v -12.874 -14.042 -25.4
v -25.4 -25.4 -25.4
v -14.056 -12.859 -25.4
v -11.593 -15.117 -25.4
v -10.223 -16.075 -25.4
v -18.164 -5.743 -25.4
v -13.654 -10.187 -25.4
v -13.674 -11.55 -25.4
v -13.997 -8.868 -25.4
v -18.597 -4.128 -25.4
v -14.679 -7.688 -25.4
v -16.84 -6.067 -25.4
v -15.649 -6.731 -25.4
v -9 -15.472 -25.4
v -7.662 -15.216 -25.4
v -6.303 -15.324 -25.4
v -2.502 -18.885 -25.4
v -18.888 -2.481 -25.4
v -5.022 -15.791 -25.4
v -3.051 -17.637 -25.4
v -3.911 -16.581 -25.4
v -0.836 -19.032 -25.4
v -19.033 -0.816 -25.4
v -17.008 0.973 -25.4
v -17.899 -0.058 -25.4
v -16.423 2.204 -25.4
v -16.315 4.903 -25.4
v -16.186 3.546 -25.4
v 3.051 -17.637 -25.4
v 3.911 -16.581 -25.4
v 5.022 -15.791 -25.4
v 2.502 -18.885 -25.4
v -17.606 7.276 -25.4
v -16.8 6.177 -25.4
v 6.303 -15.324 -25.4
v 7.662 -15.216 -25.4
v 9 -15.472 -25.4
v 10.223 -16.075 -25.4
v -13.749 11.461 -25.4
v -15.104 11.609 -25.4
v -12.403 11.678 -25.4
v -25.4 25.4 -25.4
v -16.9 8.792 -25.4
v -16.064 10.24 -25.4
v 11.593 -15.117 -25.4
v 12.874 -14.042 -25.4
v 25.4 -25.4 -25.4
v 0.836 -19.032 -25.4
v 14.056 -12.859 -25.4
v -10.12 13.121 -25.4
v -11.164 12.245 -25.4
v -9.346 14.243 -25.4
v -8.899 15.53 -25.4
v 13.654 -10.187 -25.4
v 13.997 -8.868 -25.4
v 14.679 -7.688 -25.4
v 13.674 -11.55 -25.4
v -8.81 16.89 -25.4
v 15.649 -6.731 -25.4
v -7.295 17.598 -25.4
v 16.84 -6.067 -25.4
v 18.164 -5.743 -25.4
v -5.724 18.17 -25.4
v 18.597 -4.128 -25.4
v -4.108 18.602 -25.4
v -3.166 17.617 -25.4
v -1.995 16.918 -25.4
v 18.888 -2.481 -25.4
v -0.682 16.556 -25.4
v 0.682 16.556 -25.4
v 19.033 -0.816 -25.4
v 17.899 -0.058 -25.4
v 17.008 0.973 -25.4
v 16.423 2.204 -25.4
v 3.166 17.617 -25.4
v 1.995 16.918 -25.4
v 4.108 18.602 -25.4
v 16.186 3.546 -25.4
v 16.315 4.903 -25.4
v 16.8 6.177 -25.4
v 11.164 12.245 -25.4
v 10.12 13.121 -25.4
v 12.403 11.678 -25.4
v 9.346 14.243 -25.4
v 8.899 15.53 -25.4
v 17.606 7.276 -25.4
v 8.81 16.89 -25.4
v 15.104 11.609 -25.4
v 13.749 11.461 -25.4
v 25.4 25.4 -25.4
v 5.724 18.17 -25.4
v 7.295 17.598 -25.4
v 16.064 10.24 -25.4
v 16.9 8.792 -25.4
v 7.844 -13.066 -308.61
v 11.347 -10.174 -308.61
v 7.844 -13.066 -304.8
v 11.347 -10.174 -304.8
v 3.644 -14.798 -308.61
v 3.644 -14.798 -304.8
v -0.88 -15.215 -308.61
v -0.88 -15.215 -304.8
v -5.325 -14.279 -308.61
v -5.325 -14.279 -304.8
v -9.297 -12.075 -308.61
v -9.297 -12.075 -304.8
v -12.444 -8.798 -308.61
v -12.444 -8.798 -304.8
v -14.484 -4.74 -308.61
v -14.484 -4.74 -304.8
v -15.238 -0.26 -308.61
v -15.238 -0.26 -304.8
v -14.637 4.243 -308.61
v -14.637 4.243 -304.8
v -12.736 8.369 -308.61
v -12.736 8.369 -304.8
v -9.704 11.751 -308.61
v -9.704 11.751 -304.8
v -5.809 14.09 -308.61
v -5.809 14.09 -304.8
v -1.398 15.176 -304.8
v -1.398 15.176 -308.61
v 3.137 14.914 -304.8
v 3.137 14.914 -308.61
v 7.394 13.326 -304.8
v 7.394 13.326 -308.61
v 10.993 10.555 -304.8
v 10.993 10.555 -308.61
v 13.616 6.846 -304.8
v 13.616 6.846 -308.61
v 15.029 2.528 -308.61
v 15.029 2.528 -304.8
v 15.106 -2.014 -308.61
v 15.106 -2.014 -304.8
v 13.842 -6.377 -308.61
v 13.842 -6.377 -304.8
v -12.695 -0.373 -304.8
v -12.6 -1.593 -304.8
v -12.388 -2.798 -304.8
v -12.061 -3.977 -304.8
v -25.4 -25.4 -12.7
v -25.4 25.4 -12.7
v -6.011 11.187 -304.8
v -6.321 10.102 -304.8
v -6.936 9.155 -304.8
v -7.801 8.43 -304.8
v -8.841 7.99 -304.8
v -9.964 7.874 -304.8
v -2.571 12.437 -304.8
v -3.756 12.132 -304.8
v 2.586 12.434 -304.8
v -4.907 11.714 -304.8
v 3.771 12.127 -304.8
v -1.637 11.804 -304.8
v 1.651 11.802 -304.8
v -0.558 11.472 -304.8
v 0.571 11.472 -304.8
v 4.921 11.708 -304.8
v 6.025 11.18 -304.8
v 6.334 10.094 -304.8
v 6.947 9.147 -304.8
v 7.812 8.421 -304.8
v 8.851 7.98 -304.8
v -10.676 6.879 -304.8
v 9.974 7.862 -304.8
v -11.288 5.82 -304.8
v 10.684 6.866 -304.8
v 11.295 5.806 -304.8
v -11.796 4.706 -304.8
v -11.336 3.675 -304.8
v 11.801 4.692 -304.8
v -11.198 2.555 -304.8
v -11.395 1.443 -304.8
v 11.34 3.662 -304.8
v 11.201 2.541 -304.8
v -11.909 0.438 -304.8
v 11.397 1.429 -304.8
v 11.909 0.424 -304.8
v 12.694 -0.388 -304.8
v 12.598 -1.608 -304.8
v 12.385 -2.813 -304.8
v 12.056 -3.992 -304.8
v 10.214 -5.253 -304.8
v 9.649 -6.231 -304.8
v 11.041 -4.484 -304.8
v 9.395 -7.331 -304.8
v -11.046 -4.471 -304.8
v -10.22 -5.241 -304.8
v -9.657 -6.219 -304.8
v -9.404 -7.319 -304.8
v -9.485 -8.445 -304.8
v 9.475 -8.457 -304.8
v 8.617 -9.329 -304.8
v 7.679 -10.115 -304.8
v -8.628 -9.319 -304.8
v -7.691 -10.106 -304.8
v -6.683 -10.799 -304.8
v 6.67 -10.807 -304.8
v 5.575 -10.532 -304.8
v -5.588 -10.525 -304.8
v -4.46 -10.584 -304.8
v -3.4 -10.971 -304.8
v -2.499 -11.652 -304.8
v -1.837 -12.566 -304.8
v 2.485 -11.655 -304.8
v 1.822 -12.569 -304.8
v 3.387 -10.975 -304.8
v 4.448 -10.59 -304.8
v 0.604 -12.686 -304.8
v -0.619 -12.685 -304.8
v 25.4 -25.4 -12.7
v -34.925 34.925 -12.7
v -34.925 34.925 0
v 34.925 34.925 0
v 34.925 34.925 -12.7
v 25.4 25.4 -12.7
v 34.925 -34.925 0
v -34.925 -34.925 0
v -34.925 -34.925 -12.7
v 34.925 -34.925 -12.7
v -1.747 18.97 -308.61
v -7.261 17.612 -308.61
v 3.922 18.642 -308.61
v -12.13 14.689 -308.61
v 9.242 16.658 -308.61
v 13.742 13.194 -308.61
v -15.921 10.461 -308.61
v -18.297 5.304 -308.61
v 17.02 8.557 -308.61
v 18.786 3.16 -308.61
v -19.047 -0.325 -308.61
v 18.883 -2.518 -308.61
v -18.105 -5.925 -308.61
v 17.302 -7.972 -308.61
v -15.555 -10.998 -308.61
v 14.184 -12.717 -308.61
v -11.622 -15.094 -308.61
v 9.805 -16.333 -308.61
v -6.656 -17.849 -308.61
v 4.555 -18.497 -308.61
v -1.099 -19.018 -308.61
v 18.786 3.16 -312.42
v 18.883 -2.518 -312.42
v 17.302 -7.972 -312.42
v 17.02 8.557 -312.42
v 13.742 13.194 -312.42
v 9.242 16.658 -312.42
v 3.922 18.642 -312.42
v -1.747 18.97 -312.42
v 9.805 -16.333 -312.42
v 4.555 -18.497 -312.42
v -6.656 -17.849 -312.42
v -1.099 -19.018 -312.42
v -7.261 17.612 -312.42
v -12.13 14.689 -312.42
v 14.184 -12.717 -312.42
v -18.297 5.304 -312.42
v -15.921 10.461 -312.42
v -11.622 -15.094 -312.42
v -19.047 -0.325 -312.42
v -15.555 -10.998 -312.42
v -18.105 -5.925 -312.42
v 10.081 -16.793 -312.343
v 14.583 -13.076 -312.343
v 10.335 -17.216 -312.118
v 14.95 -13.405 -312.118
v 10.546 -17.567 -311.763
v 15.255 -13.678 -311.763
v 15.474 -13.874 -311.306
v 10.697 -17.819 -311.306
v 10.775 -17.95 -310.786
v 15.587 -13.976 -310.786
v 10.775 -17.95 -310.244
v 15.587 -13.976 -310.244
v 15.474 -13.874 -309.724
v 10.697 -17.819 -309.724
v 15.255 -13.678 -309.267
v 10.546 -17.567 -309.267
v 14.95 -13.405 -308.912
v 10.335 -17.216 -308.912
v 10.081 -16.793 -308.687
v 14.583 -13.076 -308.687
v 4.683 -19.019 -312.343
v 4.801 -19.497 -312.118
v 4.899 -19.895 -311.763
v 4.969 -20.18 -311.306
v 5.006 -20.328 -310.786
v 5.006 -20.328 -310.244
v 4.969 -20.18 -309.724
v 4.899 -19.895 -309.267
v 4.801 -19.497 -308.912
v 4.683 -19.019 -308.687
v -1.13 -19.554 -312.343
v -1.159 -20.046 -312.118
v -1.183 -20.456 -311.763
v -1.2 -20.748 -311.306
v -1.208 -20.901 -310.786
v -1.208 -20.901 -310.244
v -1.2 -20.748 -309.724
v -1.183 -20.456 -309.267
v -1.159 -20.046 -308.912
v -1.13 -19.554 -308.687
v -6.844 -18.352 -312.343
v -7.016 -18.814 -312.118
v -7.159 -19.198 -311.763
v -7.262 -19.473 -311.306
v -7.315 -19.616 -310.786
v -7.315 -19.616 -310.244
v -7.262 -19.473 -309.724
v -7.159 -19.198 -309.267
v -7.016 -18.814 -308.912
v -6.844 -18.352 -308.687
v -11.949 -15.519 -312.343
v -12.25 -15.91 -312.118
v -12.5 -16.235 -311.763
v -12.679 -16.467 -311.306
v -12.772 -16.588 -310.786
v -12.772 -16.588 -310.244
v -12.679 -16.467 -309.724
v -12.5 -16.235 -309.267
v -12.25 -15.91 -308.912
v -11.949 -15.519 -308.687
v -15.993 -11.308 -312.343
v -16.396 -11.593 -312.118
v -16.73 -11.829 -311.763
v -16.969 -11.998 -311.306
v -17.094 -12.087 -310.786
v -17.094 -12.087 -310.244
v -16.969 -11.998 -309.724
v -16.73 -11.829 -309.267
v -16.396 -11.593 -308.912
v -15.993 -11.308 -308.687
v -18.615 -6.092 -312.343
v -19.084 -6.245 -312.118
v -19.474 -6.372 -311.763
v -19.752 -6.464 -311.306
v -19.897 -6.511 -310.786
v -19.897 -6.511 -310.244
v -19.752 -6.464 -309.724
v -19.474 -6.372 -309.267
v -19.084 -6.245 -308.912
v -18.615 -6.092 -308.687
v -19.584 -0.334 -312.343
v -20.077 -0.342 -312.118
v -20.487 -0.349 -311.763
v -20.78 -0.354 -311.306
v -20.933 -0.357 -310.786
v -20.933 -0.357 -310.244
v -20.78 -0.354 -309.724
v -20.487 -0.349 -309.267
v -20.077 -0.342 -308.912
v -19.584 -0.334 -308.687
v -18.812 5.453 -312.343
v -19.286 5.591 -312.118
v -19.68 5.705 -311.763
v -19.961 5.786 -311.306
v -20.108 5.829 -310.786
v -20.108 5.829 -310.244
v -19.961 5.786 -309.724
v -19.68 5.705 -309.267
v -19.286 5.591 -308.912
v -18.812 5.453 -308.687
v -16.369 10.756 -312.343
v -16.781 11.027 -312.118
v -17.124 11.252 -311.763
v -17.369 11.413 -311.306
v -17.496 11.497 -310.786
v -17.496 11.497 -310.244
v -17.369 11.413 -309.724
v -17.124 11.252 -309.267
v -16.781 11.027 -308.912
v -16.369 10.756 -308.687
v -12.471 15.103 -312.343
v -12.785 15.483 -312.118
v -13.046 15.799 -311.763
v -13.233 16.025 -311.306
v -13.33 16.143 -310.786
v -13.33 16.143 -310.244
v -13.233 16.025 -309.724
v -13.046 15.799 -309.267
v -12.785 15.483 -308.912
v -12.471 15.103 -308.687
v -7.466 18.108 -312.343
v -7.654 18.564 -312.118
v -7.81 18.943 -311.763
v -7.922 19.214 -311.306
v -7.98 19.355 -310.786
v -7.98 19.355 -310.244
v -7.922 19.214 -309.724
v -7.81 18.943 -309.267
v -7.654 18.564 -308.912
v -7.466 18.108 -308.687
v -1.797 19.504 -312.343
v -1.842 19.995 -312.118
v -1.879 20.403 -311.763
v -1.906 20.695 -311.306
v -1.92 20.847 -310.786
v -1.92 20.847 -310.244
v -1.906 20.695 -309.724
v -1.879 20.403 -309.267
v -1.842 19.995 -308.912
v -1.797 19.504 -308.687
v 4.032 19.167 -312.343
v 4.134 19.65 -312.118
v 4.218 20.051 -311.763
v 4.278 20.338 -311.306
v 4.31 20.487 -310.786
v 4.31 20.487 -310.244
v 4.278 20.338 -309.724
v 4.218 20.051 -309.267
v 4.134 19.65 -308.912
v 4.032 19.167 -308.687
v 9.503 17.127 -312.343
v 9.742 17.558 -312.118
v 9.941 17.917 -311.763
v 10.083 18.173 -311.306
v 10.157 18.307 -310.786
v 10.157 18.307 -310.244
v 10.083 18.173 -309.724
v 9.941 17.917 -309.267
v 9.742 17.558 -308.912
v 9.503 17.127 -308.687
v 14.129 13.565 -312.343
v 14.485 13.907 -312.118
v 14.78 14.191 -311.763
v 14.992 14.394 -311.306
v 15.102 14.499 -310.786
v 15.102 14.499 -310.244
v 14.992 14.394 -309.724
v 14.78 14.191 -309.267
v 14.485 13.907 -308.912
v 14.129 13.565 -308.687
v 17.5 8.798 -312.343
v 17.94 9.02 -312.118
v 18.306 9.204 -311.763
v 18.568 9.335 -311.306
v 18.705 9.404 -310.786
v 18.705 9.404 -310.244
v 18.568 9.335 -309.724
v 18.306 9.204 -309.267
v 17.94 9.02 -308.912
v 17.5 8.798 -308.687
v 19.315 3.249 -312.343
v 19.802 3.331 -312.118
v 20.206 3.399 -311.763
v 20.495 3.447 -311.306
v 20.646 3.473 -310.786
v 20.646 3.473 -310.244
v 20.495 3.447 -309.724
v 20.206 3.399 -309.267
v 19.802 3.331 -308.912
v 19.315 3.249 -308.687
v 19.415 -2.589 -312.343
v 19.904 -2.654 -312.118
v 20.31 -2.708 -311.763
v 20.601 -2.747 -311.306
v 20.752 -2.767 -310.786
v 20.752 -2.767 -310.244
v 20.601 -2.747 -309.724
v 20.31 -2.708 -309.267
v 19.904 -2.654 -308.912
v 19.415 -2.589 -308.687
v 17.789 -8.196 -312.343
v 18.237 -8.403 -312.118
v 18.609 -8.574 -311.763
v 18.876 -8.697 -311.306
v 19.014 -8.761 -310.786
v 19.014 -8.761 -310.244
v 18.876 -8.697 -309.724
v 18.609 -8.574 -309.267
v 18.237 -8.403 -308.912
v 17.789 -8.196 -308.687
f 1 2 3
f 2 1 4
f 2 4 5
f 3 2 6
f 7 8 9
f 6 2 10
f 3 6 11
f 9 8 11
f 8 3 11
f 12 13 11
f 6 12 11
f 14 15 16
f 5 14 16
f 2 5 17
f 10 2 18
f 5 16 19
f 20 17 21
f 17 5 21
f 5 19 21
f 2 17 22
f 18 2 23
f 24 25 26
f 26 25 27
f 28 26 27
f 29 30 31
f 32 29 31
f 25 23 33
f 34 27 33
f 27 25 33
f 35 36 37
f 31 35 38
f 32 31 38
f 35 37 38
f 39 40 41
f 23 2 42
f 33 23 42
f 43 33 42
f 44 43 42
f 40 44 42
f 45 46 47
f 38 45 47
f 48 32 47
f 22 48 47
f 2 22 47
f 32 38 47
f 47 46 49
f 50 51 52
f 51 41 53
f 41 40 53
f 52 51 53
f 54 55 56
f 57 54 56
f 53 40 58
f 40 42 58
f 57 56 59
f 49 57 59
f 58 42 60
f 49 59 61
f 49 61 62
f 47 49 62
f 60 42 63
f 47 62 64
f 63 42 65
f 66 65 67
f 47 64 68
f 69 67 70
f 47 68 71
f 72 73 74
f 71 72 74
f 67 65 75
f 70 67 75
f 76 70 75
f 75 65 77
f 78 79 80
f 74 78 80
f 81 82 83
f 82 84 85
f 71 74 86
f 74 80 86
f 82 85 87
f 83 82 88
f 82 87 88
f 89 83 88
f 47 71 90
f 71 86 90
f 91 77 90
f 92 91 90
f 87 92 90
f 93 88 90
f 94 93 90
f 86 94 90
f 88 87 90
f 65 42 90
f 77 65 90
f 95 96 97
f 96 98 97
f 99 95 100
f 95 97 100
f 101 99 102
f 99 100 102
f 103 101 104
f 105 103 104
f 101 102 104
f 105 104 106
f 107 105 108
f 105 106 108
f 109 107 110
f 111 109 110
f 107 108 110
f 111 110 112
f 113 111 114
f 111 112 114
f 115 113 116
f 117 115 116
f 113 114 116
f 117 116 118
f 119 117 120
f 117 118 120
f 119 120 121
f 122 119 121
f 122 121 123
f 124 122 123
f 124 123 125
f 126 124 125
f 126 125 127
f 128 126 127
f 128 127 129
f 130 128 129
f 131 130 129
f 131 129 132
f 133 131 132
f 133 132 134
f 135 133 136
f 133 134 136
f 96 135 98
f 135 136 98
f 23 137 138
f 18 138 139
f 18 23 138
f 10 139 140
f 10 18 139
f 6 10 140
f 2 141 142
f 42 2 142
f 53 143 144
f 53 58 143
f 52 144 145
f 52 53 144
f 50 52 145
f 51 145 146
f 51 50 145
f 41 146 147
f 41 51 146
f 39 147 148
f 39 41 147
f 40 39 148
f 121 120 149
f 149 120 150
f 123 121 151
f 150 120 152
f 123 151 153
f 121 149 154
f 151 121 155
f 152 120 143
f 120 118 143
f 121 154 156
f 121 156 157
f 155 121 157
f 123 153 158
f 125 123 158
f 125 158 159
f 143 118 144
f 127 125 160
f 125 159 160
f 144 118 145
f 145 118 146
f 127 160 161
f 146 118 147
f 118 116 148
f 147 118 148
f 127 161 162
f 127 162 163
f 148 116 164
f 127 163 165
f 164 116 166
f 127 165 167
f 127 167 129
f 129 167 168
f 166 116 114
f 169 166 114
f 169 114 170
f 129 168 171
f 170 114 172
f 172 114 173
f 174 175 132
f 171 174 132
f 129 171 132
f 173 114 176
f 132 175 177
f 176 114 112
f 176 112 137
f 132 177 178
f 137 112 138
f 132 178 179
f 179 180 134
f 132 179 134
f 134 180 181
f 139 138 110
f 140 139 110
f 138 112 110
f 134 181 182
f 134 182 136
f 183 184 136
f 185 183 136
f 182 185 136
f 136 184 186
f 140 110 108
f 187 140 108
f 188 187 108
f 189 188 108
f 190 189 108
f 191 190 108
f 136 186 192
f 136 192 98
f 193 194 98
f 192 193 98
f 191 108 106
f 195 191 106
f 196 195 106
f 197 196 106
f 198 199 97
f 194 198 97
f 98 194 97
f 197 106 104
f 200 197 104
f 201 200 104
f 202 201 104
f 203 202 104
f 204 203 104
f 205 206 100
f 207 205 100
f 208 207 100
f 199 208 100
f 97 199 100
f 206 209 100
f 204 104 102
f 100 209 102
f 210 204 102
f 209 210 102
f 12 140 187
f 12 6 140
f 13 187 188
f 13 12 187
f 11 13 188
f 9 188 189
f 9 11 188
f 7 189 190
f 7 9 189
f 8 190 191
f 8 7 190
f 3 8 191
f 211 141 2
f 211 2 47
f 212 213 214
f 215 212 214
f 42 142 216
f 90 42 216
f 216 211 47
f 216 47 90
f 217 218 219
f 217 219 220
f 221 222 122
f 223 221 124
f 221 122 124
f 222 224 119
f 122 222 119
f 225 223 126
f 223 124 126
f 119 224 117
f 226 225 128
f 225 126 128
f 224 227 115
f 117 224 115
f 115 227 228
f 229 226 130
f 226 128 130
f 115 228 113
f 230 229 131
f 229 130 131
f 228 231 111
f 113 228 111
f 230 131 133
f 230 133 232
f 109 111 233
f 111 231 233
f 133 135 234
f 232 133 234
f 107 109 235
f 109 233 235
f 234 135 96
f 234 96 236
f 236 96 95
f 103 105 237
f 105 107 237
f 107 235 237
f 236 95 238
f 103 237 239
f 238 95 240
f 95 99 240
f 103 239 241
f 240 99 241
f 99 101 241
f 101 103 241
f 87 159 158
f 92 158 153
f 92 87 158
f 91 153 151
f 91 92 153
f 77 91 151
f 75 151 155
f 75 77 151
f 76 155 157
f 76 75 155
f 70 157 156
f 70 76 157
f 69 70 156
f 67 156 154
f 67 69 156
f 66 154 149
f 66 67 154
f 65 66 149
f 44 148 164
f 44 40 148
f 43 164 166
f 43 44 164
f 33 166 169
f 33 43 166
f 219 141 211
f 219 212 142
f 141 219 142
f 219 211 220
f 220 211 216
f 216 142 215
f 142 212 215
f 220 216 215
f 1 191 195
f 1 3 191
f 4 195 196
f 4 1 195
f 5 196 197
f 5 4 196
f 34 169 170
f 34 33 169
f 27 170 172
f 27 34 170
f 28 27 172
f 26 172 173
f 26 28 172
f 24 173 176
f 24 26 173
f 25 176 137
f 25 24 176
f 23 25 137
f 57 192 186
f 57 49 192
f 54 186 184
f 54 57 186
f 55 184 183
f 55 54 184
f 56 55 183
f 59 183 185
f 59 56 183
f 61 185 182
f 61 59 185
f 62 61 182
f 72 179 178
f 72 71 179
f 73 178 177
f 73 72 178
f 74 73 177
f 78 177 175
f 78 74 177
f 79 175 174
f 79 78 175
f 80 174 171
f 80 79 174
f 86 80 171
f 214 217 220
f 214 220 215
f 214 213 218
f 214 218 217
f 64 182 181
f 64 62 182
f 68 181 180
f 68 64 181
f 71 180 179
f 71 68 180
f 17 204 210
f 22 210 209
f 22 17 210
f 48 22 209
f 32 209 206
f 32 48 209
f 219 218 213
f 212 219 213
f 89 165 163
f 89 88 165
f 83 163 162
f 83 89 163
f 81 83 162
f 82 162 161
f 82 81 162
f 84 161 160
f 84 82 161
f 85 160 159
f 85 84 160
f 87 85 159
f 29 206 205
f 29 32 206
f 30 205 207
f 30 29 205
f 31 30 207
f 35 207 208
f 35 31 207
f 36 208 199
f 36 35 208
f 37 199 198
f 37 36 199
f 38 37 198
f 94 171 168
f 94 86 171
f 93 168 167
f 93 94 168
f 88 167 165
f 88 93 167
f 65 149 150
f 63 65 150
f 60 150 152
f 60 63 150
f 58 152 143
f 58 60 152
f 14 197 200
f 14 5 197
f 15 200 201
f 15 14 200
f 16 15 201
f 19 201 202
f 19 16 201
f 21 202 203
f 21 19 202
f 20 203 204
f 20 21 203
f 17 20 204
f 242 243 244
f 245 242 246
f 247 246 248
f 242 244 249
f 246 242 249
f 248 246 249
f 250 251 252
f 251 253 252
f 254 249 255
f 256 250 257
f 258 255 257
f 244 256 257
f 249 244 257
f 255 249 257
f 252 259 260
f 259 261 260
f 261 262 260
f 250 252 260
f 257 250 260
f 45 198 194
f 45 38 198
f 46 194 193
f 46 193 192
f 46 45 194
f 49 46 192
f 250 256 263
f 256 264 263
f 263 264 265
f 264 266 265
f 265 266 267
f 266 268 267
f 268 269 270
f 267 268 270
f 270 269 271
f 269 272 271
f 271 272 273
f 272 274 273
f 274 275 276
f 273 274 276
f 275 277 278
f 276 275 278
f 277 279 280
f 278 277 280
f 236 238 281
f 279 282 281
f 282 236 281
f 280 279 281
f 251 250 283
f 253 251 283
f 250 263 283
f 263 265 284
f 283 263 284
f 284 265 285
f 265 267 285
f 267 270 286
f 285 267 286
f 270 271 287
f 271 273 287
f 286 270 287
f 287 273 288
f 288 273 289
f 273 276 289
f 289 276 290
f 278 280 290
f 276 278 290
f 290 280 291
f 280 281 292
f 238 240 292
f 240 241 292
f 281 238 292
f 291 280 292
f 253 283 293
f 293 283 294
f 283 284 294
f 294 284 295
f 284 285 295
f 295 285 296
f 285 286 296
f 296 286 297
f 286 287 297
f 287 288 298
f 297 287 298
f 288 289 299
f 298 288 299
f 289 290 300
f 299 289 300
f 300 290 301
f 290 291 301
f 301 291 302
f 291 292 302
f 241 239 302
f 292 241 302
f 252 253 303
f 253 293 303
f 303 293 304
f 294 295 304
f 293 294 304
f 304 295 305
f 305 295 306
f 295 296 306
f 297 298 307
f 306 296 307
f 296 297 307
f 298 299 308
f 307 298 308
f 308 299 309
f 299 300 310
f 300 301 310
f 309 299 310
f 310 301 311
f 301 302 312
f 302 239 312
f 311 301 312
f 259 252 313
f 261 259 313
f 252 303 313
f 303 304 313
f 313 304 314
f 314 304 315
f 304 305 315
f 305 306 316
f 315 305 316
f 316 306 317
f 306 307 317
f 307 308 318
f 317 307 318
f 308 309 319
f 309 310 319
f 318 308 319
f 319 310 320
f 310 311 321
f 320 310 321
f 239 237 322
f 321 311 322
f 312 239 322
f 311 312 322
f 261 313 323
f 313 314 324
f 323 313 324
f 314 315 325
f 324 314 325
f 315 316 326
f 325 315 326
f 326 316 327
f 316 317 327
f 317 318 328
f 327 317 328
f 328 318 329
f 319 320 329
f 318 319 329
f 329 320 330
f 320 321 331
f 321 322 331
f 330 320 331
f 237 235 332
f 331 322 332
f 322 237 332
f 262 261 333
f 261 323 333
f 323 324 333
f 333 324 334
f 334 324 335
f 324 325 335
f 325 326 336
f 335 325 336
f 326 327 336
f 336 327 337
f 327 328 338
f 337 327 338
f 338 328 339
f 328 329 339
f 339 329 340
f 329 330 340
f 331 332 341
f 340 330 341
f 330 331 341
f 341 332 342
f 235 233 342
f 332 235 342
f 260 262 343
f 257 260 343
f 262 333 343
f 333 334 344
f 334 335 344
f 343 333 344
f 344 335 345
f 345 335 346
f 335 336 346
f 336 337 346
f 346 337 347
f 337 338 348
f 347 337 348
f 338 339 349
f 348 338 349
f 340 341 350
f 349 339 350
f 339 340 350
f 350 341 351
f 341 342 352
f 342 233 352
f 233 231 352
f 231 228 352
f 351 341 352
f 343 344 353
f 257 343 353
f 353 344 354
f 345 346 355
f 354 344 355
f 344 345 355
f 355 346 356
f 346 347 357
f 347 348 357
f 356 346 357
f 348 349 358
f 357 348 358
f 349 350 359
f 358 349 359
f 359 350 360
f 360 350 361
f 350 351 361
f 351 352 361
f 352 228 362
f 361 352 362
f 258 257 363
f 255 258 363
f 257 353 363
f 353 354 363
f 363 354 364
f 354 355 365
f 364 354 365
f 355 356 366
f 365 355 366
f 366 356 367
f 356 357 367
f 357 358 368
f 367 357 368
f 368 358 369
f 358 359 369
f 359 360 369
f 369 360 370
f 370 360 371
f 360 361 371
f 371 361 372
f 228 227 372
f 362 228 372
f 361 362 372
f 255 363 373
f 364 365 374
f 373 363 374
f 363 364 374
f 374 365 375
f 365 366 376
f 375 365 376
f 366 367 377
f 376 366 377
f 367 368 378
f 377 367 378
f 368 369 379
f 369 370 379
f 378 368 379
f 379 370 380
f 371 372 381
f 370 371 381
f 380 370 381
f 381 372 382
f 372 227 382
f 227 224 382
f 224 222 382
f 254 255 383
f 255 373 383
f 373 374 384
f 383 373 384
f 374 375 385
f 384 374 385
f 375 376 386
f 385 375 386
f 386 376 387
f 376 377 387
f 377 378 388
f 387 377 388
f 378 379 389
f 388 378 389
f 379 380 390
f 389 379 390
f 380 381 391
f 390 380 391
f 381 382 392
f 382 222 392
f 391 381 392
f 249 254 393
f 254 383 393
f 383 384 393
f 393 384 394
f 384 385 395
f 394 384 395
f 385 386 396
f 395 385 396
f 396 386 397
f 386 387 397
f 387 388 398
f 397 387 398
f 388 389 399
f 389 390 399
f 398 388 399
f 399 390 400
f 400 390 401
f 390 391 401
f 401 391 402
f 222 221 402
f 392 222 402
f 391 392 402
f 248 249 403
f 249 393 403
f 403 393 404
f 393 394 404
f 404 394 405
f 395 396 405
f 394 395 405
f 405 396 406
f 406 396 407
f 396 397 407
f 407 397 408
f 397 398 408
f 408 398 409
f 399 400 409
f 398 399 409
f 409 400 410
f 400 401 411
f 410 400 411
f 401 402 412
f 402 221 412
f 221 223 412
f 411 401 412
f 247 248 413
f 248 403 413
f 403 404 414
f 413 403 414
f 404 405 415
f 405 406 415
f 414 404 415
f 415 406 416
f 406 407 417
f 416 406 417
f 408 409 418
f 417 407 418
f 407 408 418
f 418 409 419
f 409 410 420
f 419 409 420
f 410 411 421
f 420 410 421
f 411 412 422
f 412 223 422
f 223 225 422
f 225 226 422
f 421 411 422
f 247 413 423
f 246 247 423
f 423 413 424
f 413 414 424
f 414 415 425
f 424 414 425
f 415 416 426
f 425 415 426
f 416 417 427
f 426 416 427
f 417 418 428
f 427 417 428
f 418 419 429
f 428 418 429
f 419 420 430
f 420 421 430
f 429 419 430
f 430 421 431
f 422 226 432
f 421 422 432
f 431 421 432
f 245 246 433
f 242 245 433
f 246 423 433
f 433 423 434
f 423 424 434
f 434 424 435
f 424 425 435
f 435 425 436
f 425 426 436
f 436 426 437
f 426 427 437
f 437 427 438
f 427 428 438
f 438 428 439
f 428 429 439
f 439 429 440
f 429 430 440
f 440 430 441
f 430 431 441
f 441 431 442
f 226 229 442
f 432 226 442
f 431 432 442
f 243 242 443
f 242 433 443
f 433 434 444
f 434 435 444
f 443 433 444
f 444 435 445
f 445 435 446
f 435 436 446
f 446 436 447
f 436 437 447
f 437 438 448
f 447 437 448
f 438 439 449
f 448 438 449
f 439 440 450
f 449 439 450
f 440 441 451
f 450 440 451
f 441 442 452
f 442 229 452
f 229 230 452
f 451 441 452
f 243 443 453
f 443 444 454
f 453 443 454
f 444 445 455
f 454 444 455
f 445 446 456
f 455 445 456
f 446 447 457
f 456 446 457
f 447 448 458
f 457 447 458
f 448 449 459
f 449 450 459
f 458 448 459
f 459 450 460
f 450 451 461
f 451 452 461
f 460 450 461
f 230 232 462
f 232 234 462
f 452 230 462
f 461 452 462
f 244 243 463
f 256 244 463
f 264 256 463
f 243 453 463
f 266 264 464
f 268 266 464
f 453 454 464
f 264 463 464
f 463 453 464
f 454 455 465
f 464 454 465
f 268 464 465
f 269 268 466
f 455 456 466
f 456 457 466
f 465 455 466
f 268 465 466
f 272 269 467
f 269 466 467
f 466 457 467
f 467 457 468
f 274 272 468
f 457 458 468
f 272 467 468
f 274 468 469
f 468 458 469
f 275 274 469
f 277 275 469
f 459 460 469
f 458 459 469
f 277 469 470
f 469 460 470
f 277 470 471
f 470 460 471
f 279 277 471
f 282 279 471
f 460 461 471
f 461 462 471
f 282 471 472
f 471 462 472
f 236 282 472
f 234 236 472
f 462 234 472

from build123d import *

# Parameters (mm, degrees)
F1_W     = 50.8
F1_H     = 50.8
F2_DEPTH = 25.4
F0_W     = 69.85
F0_H     = 69.85
F3_DEPTH = 12.7


with BuildPart() as f2:
    # F1 (on Top) → F2 (new body)
    with BuildSketch(Plane.XY):
        Rectangle(F1_W, F1_H)
    extrude(amount=-F2_DEPTH)

    # F0 (on Top) → F3 (join)
    with BuildSketch(Plane.XY):
        Rectangle(F0_W, F0_H)
    extrude(amount=-F3_DEPTH)

    # F6 (on offset) → F7 section 0
    with BuildSketch(Plane.XY.offset(-304.8)):
        with BuildLine():
            ThreePointArc((1.8223172477, -12.5685782748), (3.902854843, -10.743026765), (6.6700057903, -10.8074521862))
            ThreePointArc((6.6700057903, -10.8074521862), (8.1575727221, -9.7336533369), (9.4749023876, -8.4567265975))
            ThreePointArc((9.4749023876, -8.4567265975), (9.8952447599, -5.7209292202), (12.0564172288, -3.991591613))
            ThreePointArc((12.0564172288, -3.991591613), (12.5057350151, -2.2128243791), (12.6940753985, -0.3878785593))
            ThreePointArc((12.6940753985, -0.3878785593), (11.2575396802, 1.9780546879), (11.8014970538, 4.6919790376))
            ThreePointArc((11.8014970538, 4.6919790376), (11.0023249087, 6.3434096985), (9.9735494515, 7.8624621677))
            ThreePointArc((9.9735494515, 7.8624621677), (7.3523066706, 8.7514848238), (6.0245252483, 11.1801205509))
            ThreePointArc((6.0245252483, 11.1801205509), (4.3508047004, 11.931491879), (2.5862888725, 12.4338694648))
            ThreePointArc((2.5862888725, 12.4338694648), (0.006847658, 11.4299979488), (-2.571388876, 12.4369594053))
            ThreePointArc((-2.571388876, 12.4369594053), (-4.3365053811, 11.9366964056), (-6.0111250133, 11.1873310523))
            ThreePointArc((-6.0111250133, 11.1873310523), (-7.3418154499, 8.7602880032), (-9.9641215675, 7.8744067325))
            ThreePointArc((-9.9641215675, 7.8744067325), (-10.9947163999, 6.3565880224), (-11.7958666993, 4.7061161071))
            ThreePointArc((-11.7958666993, 4.7061161071), (-11.2551615136, 1.9915419412), (-12.6945310386, -0.3726683647))
            ThreePointArc((-12.6945310386, -0.3726683647), (-12.5083774225, -2.1978385421), (-12.0611912601, -3.9771428673))
            ThreePointArc((-12.0611912601, -3.9771428673), (-9.9020924178, -5.7090687286), (-9.4850283528, -8.4453677923))
            ThreePointArc((-9.4850283528, -8.4453677923), (-8.169229634, -9.7238720265), (-6.6829503852, -10.799452493))
            ThreePointArc((-6.6829503852, -10.799452493), (-3.9157242303, -10.7383426911), (-1.8373754864, -12.5663857701))
            ThreePointArc((-1.8373754864, -12.5663857701), (-0.0076085088, -12.6999977209), (1.8223172477, -12.5685782748))
        make_face()
    # F4 (on face) → F7 section 1
    with BuildSketch(Plane(origin=(0, 0, -25.4), x_dir=(1, 0, 0), z_dir=(0, 0, -1))):
        with BuildLine():
            ThreePointArc((8.8099627366, -16.8904427586), (10.6124234359, -12.6473937559), (15.1040050059, -11.6091142117))
            ThreePointArc((15.1040050059, -11.6091142117), (16.4977839421, -9.525), (17.6057903258, -7.2758949281))
            ThreePointArc((17.6057903258, -7.2758949281), (16.2591760022, -2.8669314133), (19.0325338784, 0.815569843))
            ThreePointArc((19.0325338784, 0.815569843), (18.7605876949, 3.3079977846), (18.163672955, 5.7431250017))
            ThreePointArc((18.163672955, 5.7431250017), (14.2980794165, 8.255), (14.0555286261, 12.8586397042))
            ThreePointArc((14.0555286261, 12.8586397042), (12.2451039645, 14.5931466414), (10.2225711418, 16.0748729155))
            ThreePointArc((10.2225711418, 16.0748729155), (5.6467525663, 15.5143251692), (2.5017853198, 18.8850091399))
            ThreePointArc((2.5017853198, 18.8850091399), (0, 19.05), (-2.5017853198, 18.8850091399))
            ThreePointArc((-2.5017853198, 18.8850091399), (-5.6467525663, 15.5143251692), (-10.2225711418, 16.0748729155))
            ThreePointArc((-10.2225711418, 16.0748729155), (-12.2451039645, 14.5931466414), (-14.0555286261, 12.8586397042))
            ThreePointArc((-14.0555286261, 12.8586397042), (-14.2980794165, 8.255), (-18.163672955, 5.7431250017))
            ThreePointArc((-18.163672955, 5.7431250017), (-18.7605876949, 3.3079977846), (-19.0325338784, 0.815569843))
            ThreePointArc((-19.0325338784, 0.815569843), (-16.2591760022, -2.8669314133), (-17.6057903258, -7.2758949281))
            ThreePointArc((-17.6057903258, -7.2758949281), (-16.4977839421, -9.525), (-15.1040050059, -11.6091142117))
            ThreePointArc((-15.1040050059, -11.6091142117), (-10.6124234359, -12.6473937559), (-8.8099627366, -16.8904427586))
            ThreePointArc((-8.8099627366, -16.8904427586), (-6.5154837304, -17.901144426), (-4.1081443289, -18.6017647059))
            ThreePointArc((-4.1081443289, -18.6017647059), (0, -16.51), (4.1081443289, -18.6017647059))
            ThreePointArc((4.1081443289, -18.6017647059), (6.5154837304, -17.901144426), (8.8099627366, -16.8904427586))
        make_face()
    loft()

    # F10 (on 3pt) → F11 (revolve)
    with BuildSketch(Plane(origin=(0, 0, 0), x_dir=(0.7445427832, -0.6675747479, 0), z_dir=(-0.6675747479, -0.7445427832, 0))):
        with BuildLine():
            Line((15.24, -304.8), (0, -304.8))
            Line((0, -304.8), (0, -312.42))
            Line((0, -312.42), (19.05, -312.42))
            ThreePointArc((19.05, -312.42), (20.955, -310.515), (19.05, -308.61))
            Line((19.05, -308.61), (15.24, -308.61))
            Line((15.24, -308.61), (15.24, -304.8))
        make_face()
    revolve(axis=Axis((0, 0, -308.61), (0, 0, -1)))


solid = f2.part
